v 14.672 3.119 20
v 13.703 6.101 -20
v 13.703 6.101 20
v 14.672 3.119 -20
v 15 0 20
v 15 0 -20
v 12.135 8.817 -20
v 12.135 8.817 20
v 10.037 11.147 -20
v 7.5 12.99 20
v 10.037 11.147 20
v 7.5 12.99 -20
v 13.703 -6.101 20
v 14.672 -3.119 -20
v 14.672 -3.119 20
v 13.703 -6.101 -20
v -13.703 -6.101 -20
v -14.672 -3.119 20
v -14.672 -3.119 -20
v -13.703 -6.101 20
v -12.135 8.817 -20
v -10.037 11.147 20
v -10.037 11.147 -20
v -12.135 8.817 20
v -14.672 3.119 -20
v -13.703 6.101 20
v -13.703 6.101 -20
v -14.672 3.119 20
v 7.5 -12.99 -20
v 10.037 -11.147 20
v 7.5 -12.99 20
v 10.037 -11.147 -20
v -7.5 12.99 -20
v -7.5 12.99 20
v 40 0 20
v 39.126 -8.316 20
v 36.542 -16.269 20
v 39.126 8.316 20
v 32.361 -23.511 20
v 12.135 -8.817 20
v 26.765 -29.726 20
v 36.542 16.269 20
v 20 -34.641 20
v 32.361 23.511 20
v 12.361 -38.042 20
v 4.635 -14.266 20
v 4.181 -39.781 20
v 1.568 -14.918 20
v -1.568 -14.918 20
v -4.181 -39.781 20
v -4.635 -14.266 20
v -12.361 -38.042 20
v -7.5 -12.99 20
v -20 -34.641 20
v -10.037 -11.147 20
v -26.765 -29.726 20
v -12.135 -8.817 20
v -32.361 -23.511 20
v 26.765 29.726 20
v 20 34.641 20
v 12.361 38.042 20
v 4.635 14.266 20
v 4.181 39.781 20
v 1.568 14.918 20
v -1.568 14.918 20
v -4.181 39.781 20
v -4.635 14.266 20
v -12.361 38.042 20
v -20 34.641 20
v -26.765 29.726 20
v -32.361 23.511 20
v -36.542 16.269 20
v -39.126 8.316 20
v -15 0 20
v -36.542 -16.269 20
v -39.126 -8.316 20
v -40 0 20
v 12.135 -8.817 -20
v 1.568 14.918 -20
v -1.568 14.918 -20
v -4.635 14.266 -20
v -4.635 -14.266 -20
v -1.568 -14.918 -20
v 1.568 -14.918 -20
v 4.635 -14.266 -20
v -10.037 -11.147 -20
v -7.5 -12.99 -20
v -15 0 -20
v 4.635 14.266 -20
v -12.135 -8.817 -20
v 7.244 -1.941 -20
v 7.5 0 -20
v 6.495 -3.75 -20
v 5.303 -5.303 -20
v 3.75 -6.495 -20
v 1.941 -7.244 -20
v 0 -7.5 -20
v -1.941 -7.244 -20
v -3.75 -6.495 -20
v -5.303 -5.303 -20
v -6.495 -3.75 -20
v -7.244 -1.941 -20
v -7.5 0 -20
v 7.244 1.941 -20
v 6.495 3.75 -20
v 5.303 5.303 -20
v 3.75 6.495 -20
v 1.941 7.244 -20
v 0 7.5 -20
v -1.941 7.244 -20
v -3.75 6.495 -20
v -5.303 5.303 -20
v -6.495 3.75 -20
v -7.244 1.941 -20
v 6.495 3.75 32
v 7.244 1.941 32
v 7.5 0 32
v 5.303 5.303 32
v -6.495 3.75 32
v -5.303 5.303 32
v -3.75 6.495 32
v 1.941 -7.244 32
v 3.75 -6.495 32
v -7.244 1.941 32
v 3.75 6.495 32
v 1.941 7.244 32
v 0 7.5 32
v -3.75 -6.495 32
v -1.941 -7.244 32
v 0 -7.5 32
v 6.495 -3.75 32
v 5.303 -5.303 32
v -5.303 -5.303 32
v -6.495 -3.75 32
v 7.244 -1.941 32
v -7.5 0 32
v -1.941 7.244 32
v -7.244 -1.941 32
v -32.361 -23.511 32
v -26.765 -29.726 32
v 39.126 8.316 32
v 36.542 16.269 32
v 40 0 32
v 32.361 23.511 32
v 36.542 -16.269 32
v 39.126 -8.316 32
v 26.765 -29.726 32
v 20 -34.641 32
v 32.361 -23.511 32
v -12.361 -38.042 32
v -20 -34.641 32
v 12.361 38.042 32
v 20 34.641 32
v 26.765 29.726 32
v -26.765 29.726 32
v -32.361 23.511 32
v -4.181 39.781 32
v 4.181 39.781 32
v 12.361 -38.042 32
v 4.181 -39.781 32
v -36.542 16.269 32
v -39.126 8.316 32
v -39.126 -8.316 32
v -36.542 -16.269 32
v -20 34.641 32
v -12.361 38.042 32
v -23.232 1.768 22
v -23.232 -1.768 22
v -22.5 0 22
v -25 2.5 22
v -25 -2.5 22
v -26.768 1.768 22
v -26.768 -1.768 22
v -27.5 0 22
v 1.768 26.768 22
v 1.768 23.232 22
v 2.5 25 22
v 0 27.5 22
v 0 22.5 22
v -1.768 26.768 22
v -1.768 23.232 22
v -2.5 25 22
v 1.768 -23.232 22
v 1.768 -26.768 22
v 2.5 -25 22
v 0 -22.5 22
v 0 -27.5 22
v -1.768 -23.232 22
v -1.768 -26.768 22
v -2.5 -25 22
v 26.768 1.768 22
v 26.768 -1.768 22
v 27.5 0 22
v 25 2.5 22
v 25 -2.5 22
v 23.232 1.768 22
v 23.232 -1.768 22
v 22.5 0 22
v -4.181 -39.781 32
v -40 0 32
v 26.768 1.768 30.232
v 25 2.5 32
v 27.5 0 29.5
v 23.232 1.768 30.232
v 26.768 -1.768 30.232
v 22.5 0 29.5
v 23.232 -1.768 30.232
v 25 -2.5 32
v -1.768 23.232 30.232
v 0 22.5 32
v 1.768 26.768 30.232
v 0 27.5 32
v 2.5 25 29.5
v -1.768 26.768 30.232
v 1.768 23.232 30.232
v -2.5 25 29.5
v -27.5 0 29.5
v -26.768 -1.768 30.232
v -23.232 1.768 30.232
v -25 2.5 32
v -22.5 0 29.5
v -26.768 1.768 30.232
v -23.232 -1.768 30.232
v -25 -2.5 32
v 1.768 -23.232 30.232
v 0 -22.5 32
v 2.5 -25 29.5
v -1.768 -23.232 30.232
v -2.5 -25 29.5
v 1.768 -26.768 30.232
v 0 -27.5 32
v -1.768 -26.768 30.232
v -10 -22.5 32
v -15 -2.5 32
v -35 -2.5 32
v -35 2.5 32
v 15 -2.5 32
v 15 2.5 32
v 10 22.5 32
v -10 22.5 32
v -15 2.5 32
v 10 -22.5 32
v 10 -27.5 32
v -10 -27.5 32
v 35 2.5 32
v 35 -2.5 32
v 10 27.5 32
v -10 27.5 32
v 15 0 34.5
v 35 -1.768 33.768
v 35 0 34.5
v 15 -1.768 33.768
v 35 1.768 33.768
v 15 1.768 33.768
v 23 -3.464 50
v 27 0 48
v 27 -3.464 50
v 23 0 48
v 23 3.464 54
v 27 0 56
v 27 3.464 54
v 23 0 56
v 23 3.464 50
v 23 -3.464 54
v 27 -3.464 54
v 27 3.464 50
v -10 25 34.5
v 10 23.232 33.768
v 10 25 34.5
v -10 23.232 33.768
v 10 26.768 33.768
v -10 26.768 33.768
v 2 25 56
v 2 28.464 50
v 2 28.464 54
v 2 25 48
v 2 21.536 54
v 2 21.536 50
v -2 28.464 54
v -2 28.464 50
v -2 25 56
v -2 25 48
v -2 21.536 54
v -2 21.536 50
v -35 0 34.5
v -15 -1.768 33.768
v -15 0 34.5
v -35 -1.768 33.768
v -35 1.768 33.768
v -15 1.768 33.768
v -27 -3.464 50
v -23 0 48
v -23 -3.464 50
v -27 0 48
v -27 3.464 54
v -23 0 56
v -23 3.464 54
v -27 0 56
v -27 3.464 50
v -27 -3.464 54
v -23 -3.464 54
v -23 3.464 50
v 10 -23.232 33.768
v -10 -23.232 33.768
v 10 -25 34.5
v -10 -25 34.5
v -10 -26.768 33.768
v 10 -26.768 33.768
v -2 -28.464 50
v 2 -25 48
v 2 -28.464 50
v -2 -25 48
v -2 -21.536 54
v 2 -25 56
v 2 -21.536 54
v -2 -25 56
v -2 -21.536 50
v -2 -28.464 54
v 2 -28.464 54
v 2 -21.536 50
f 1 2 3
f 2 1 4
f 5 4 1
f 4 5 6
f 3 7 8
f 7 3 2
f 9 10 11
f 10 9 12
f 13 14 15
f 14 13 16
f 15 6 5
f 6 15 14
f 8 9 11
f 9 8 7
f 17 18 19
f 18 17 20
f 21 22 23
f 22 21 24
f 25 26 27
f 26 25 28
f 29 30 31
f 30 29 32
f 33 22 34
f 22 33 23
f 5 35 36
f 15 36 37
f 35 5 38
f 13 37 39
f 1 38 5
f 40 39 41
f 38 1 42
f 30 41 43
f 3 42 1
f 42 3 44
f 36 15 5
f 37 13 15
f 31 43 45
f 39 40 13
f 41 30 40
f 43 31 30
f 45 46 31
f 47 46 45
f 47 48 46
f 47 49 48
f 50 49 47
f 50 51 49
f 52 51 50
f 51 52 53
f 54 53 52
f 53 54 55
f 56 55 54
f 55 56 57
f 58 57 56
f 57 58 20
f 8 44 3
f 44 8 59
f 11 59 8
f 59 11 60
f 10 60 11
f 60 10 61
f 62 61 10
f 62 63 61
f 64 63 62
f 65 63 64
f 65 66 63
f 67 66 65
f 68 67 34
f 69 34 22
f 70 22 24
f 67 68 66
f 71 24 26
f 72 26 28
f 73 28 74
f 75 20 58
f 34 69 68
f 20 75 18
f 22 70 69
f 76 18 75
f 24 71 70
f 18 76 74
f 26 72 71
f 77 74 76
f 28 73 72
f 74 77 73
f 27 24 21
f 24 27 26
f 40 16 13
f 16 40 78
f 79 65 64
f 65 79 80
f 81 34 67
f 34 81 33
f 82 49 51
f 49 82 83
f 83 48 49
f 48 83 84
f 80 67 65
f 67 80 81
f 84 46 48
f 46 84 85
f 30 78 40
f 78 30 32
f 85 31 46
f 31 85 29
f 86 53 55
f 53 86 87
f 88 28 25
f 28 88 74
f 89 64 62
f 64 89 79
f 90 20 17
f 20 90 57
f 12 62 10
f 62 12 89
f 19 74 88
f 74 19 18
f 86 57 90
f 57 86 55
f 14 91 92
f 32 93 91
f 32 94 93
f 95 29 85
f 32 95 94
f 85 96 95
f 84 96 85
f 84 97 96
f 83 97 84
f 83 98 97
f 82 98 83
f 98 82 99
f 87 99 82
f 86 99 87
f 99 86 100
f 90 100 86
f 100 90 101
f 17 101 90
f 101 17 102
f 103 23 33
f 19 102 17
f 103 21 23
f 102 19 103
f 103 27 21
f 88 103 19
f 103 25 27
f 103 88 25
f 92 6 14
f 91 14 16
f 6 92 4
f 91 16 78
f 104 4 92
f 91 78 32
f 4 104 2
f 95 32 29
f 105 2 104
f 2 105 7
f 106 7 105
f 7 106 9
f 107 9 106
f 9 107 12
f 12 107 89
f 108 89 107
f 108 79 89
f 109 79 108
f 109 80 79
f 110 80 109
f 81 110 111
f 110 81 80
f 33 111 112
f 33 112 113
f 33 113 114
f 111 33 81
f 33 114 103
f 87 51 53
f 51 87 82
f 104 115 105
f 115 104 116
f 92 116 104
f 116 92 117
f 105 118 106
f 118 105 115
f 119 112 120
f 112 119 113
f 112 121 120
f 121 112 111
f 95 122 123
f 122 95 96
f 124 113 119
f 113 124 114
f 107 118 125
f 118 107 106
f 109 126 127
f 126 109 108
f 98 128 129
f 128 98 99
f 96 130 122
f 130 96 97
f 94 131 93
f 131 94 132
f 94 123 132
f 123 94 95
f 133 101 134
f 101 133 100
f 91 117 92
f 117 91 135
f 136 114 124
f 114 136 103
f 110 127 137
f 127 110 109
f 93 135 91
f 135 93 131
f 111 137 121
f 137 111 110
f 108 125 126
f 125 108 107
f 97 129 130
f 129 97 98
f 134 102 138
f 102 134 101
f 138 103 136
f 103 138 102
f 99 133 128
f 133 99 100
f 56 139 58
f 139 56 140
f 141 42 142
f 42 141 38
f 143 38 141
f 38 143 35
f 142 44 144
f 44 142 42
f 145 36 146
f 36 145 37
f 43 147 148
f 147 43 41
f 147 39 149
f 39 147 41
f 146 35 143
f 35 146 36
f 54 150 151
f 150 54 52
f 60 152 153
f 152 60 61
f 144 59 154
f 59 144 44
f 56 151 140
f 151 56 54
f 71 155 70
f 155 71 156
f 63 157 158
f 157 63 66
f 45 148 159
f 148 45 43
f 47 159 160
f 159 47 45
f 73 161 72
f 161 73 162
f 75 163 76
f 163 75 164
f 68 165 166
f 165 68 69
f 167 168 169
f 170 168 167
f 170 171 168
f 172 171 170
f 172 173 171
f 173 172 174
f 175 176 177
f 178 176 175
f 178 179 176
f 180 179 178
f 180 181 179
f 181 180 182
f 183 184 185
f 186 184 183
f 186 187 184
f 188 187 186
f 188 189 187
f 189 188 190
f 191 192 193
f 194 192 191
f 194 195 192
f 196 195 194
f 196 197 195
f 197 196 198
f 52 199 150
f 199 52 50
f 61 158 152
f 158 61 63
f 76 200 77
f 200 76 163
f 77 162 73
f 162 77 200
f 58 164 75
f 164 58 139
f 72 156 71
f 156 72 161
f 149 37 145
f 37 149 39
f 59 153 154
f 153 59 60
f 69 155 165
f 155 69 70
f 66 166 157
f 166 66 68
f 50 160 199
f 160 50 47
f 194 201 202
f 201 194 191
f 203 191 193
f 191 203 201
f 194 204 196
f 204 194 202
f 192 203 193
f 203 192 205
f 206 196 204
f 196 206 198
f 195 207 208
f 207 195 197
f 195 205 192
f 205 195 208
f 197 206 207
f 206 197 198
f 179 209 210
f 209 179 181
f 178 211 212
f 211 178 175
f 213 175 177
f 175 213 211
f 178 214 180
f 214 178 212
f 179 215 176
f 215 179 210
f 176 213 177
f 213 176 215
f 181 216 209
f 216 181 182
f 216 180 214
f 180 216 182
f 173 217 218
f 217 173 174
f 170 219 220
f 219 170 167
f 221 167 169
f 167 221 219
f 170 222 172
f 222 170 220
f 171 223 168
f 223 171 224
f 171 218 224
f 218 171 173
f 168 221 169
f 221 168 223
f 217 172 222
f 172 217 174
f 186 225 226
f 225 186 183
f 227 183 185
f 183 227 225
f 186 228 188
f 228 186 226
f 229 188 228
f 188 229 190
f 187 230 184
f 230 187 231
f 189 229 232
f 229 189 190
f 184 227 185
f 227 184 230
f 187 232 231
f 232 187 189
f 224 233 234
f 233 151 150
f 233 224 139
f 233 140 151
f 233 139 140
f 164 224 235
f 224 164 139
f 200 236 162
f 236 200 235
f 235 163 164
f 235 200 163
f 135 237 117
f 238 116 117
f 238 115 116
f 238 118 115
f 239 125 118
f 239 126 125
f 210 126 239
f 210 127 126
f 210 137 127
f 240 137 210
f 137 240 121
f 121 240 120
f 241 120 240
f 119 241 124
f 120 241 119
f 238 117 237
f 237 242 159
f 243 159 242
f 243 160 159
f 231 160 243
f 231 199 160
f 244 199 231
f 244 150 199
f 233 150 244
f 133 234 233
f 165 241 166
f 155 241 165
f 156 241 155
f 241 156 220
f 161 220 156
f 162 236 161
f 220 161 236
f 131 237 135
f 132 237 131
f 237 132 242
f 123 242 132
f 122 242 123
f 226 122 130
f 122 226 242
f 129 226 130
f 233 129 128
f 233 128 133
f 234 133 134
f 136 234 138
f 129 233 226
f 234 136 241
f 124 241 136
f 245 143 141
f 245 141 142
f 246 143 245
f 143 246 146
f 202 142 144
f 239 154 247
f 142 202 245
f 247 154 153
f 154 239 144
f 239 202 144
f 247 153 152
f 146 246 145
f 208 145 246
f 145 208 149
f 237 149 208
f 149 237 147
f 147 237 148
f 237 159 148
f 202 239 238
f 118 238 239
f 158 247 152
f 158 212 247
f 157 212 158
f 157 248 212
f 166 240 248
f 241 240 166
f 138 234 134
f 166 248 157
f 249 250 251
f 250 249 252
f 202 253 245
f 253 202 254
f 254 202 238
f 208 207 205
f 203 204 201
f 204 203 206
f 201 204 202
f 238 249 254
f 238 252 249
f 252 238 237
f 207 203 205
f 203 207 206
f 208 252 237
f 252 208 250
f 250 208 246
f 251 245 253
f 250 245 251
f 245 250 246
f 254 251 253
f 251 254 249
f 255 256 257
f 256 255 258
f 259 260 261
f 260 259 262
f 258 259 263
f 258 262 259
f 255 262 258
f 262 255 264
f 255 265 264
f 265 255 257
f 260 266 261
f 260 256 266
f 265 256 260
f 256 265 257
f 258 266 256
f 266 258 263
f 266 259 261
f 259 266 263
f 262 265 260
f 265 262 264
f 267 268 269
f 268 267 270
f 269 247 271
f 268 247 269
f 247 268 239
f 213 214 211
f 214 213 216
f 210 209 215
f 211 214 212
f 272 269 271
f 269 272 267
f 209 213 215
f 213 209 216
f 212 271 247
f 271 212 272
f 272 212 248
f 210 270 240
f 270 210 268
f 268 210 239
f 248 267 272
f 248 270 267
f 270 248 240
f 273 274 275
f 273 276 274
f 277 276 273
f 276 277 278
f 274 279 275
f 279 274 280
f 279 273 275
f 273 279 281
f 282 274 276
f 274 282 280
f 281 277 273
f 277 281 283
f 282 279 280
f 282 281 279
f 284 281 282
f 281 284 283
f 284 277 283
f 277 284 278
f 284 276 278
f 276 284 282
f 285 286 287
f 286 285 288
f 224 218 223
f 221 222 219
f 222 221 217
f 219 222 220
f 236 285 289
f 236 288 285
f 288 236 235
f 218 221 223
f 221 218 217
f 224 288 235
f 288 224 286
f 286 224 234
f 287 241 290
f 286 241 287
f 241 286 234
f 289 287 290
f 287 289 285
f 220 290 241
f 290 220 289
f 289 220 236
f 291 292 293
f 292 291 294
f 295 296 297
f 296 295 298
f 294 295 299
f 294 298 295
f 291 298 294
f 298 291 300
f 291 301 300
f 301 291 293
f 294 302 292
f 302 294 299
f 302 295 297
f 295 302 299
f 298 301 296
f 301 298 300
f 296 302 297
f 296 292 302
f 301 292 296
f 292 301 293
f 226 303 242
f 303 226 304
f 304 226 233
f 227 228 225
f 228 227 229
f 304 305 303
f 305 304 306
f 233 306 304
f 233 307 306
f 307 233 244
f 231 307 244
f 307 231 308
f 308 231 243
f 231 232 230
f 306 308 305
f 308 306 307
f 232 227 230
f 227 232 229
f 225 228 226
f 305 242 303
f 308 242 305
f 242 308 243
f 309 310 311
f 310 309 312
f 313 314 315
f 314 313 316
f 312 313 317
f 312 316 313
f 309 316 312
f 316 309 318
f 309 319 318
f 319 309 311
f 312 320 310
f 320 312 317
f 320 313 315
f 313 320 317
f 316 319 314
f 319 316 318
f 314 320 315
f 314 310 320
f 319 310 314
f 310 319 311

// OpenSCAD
// Parameters
hub_diameter = 30;
hub_length = 40;
shaft_hole_diameter = 15;
flange_diameter = 80;
flange_thickness = 10;
spacer_thickness = 2;
bolt_hole_diameter = 5;
bolt_diameter = 5;
bolt_length = 20;
nut_size = 8;
bolt_count = 4;
bolt_circle_diameter = 50;

// Hub
module hub() {
    difference() {
        cylinder(d=hub_diameter, h=hub_length, center=true);
        cylinder(d=shaft_hole_diameter, h=hub_length + 2, center=true);
    }
}

// Flange Plate
module flange_plate() {
    difference() {
        cylinder(d=flange_diameter, h=flange_thickness, center=true);
        cylinder(d=shaft_hole_diameter, h=flange_thickness + 2, center=true);
        for (i = [0:bolt_count-1]) {
            angle = i * 360 / bolt_count;
            translate([bolt_circle_diameter/2 * cos(angle), bolt_circle_diameter/2 * sin(angle), 0])
                cylinder(d=bolt_hole_diameter, h=flange_thickness + 2, center=true);
        }
    }
}

// Spacer Ring
module spacer_ring() {
    difference() {
        cylinder(d=flange_diameter, h=spacer_thickness, center=true);
        cylinder(d=shaft_hole_diameter, h=spacer_thickness + 2, center=true);
    }
}

// Bolt
module bolt() {
    cylinder(d=bolt_diameter, h=bolt_length, center=true);
}

// Nut
module nut() {
    cylinder(d=nut_size, h=nut_size/2, center=true, $fn=6);
}

// Assembly
module coupling_assembly() {
    hub();
    translate([0, 0, hub_length/2 + spacer_thickness/2])
        spacer_ring();
    translate([0, 0, hub_length/2 + spacer_thickness + flange_thickness/2])
        flange_plate();
    
    for (i = [0:bolt_count-1]) {
        angle = i * 360 / bolt_count;
        translate([bolt_circle_diameter/2 * cos(angle), bolt_circle_diameter/2 * sin(angle), hub_length/2 + spacer_thickness + flange_thickness])
            rotate([0, 90, 0])
                bolt();
        translate([bolt_circle_diameter/2 * cos(angle), bolt_circle_diameter/2 * sin(angle), hub_length/2 + spacer_thickness + flange_thickness + bolt_length])
            rotate([0, 90, 0])
                nut();
    }
}

// Render the coupling assembly
coupling_assembly();
